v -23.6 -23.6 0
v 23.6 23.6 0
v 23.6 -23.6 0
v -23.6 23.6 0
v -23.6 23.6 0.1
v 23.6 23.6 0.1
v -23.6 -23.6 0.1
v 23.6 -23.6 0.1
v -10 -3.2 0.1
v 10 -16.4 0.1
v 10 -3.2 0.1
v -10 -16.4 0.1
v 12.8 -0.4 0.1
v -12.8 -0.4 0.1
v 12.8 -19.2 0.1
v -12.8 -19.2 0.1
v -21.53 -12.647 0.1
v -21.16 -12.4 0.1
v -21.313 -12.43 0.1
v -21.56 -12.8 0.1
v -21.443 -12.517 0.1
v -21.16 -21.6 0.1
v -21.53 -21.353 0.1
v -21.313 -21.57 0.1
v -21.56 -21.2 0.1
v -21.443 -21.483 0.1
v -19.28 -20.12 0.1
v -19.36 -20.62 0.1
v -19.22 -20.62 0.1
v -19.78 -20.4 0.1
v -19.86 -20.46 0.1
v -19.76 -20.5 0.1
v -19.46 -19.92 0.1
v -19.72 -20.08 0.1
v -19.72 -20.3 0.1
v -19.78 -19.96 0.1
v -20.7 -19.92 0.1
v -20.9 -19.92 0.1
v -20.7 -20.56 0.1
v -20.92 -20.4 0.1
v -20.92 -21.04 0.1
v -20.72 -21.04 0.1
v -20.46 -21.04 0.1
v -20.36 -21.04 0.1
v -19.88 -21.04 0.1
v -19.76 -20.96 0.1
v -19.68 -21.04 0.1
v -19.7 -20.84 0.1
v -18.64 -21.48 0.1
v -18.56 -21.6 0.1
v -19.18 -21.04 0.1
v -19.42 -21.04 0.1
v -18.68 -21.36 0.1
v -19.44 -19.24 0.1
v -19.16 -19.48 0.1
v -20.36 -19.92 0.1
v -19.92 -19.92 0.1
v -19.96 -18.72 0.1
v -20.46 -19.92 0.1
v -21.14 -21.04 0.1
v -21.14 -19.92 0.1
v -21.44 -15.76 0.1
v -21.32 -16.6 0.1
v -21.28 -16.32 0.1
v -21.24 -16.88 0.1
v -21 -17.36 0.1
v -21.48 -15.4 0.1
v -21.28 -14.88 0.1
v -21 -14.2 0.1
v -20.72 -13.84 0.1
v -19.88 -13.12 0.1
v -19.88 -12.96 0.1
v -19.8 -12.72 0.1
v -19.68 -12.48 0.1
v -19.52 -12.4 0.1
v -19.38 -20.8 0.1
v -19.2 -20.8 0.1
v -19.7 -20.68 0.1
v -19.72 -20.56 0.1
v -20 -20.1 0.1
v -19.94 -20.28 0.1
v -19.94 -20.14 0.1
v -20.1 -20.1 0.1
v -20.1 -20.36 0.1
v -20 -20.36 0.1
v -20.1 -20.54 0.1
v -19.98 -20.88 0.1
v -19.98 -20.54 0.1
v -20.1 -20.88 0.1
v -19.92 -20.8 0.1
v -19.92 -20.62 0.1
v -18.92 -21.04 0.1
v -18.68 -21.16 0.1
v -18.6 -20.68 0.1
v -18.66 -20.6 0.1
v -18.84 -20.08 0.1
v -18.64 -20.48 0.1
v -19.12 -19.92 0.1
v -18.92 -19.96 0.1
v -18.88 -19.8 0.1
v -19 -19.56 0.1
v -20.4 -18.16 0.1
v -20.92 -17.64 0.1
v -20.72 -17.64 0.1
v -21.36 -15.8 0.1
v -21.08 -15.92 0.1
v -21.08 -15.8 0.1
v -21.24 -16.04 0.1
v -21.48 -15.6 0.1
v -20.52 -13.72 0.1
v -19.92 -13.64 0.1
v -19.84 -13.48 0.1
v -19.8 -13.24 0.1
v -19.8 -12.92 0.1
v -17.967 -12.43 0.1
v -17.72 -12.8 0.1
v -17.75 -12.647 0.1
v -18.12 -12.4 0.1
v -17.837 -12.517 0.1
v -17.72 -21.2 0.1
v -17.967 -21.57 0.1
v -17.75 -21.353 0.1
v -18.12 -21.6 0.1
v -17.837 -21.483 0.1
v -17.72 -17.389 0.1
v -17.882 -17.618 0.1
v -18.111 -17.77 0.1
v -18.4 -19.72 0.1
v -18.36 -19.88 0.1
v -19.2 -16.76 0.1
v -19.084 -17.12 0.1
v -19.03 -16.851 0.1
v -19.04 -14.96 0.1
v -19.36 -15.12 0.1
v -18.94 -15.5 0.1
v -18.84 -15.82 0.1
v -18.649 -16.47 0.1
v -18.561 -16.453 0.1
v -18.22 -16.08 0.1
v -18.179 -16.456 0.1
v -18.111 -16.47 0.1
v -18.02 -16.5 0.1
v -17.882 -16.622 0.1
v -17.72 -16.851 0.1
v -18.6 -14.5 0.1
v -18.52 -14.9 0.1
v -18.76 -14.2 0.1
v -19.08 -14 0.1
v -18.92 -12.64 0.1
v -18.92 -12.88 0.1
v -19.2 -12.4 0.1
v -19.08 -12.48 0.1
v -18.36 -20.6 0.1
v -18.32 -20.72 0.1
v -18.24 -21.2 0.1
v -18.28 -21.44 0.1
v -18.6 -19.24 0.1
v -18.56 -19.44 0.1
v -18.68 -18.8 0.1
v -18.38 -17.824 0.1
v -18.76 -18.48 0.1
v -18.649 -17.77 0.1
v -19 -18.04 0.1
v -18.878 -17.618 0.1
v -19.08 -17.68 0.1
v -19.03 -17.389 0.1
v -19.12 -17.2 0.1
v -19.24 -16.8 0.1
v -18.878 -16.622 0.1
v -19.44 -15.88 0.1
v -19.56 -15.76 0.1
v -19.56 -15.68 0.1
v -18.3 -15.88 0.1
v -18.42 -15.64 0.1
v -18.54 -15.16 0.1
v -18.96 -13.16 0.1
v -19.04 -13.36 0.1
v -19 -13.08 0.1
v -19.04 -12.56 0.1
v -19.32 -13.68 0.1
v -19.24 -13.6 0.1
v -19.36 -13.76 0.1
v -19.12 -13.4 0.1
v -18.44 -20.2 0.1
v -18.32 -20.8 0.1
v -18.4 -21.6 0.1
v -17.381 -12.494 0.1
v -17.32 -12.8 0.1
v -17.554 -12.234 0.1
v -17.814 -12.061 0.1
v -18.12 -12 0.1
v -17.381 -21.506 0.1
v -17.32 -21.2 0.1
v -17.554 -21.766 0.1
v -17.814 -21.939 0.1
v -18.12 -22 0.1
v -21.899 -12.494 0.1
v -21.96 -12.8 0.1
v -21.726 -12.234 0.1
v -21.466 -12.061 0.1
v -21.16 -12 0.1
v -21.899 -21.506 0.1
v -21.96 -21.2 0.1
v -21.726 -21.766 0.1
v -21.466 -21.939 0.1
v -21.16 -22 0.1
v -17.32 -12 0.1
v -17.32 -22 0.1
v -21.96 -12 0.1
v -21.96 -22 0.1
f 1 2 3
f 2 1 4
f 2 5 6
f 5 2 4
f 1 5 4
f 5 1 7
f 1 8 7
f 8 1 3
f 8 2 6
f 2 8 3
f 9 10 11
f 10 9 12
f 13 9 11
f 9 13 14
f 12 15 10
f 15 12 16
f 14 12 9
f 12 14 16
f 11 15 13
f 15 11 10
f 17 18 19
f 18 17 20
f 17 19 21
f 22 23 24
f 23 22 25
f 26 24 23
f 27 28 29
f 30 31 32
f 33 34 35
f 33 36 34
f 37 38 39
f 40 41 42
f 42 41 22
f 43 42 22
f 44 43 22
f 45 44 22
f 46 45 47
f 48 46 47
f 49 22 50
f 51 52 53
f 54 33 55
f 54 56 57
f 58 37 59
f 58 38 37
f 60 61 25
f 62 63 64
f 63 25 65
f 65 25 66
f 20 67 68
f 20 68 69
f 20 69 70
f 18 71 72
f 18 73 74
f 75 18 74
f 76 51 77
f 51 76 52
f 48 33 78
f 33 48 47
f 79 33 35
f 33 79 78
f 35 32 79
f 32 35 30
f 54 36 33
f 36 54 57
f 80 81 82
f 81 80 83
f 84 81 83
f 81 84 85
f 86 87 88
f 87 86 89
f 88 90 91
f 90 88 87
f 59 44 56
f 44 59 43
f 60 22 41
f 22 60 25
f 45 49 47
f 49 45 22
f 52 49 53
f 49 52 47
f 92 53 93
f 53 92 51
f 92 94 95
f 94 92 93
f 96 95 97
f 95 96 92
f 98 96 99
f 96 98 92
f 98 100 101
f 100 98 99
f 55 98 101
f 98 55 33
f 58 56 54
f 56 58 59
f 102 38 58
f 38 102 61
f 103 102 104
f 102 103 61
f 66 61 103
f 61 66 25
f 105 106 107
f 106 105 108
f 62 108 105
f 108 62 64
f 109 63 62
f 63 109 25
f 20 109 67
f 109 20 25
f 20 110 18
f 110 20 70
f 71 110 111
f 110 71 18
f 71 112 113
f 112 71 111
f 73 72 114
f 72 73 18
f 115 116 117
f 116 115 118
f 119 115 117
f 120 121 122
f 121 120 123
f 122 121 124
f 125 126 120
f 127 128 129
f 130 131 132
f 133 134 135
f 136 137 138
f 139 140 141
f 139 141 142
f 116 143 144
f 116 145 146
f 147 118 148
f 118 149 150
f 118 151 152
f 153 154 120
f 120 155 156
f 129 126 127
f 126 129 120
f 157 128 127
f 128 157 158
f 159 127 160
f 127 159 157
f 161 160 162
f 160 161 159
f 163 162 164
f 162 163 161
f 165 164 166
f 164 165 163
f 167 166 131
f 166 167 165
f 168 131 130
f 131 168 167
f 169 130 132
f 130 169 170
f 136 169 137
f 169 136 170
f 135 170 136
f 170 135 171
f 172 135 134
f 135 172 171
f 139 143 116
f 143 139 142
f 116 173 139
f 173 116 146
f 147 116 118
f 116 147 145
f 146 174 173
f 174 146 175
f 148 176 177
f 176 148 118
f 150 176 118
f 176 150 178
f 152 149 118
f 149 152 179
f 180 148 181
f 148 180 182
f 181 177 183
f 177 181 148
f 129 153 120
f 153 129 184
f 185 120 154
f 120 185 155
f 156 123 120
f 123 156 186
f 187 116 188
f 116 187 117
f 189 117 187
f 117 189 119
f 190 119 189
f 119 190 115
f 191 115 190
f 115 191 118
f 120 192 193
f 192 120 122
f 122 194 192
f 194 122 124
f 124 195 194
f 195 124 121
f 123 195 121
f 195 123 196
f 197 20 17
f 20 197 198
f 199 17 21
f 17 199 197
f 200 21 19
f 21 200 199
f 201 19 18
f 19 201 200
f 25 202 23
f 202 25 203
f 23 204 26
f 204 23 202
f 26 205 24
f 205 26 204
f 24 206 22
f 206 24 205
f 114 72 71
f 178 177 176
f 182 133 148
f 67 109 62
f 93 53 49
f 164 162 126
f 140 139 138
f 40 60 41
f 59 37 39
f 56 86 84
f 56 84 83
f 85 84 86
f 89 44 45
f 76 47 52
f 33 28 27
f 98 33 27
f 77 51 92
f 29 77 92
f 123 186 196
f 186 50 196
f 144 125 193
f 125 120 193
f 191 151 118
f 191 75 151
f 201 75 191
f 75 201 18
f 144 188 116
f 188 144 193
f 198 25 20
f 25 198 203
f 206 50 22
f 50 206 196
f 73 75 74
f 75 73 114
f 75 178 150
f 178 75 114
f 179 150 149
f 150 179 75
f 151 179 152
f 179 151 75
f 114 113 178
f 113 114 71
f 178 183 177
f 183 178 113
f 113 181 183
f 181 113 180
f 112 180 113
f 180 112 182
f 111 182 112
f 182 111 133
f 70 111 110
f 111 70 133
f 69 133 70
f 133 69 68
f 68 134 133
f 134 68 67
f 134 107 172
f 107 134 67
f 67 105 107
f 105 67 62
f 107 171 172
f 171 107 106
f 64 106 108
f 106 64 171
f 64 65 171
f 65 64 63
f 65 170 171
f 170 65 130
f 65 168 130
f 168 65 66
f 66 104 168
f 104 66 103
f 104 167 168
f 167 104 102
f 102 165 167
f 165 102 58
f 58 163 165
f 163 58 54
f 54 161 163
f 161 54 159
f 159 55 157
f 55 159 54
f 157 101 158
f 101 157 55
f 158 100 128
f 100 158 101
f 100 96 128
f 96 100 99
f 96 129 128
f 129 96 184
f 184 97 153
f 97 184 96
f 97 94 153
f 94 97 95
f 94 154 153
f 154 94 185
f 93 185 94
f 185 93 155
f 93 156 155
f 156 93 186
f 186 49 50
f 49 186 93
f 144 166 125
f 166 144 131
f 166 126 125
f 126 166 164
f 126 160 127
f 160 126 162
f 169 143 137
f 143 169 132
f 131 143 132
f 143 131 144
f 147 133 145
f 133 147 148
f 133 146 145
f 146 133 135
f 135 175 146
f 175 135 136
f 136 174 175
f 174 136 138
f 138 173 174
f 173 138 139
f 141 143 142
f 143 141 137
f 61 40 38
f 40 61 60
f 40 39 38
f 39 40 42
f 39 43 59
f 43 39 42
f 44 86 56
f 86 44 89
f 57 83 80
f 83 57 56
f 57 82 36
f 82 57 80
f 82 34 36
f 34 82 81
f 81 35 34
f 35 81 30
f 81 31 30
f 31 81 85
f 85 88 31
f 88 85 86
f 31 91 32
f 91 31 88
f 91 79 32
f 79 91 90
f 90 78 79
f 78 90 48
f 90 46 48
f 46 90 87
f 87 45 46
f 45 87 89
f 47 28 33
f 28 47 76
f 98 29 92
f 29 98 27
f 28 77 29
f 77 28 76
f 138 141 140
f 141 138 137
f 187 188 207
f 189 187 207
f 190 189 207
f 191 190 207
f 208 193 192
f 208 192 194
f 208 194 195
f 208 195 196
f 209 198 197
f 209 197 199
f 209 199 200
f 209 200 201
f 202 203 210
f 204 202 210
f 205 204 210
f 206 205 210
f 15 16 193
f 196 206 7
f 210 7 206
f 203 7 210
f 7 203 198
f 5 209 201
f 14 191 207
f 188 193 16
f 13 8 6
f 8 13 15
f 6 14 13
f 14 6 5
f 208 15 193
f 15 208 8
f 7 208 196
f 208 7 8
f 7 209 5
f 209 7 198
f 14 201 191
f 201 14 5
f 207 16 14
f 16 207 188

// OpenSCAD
// file: ../p/1-4ring1.scad
use <../lib.scad>
function ldraw_lib__1_4ring1() = [
// 0 Ring  1 x 0.25
// 0 Name: 1-4ring1.dat
// 0 Author: Chris Dee [cwdee]
// 0 !LDRAW_ORG Primitive UPDATE 2012-01
// 0 !LICENSE Licensed under CC BY 4.0 : see CAreadme.txt
// 
// 0 BFC CERTIFY CCW
  [0,"BFC","CERTIFY"],
  [0,"BFC","CCW"],
// 
// 0 !HISTORY 2000-05-07 [PTadmin] Official Update 2000-01
// 0 !HISTORY 2002-11-22 [hafhead] Added BFC statement
// 0 !HISTORY 2002-11-30 [PTadmin] Official Update 2002-05
// 0 !HISTORY 2007-06-22 [PTadmin] Header formatted for Contributor Agreement
// 0 !HISTORY 2008-07-01 [PTadmin] Official Update 2008-01
// 0 !HISTORY 2012-02-16 [Philo] Changed to CCW
// 0 !HISTORY 2012-03-30 [PTadmin] Official Update 2012-01
// 
// 
// 4 16 2 0 0 1.8478 0 0.7654 0.9239 0 0.3827 1 0 0
  [4,16,2,0,0,1.8478,0,0.7654,0.9239,0,0.3827,1,0,0],
// 4 16 1.8478 0 0.7654 1.4142 0 1.4142 0.7071 0 0.7071 0.9239 0 0.3827
  [4,16,1.8478,0,0.7654,1.4142,0,1.4142,0.7071,0,0.7071,0.9239,0,0.3827],
// 4 16 1.4142 0 1.4142 0.7654 0 1.8478 0.3827 0 0.9239 0.7071 0 0.7071
  [4,16,1.4142,0,1.4142,0.7654,0,1.8478,0.3827,0,0.9239,0.7071,0,0.7071],
// 4 16 0.7654 0 1.8478 0 0 2 0 0 1 0.3827 0 0.9239
  [4,16,0.7654,0,1.8478,0,0,2,0,0,1,0.3827,0,0.9239],
];
module ldraw_lib__1_4ring1(step=0, col=false, unit=2/5, alt=false, line=0.2, solid=!$preview)
    makepoly(ldraw_lib__1_4ring1(), step=step, col=col, unit=unit, alt=alt, line=line, solid=solid);
ldraw_lib__1_4ring1(line=0.2);
// file: ../p/1-4chrd.scad
use <../lib.scad>
function ldraw_lib__1_4chrd() = [
// 0 Chord 0.25
// 0 Name: 1-4chrd.dat
// 0 Author: Max Martin Richter [MMR1988]
// 0 !LDRAW_ORG Primitive UPDATE 2023-05
// 0 !LICENSE Licensed under CC BY 4.0 : see CAreadme.txt
// 
// 0 BFC CERTIFY CCW
  [0,"BFC","CERTIFY"],
  [0,"BFC","CCW"],
// 
// 0 !HISTORY 2004-04-22 [PTadmin] Official Update 2004-02
// 0 !HISTORY 2007-10-09 [PTadmin] Header formatted for Contributor Agreement
// 0 !HISTORY 2008-07-01 [PTadmin] Official Update 2008-01
// 0 !HISTORY 2012-08-02 [MMR1988] Re-creation with PrimGen2 and Rectifier
// 0 !HISTORY 2012-08-09 [PTadmin] Official Update 2012-02
// 0 !HISTORY 2023-10-27 [OrionP] Change author to MMR1988 from hafhead
// 0 !HISTORY 2023-10-31 [OrionP] Official Update 2023-05
// 
// 4 16 0.9239 0 0.3827 0.3827 0 0.9239 0 0 1 1 0 0
  [4,16,0.9239,0,0.3827,0.3827,0,0.9239,0,0,1,1,0,0],
// 3 16 0.7071 0 0.7071 0.3827 0 0.9239 0.9239 0 0.3827
  [3,16,0.7071,0,0.7071,0.3827,0,0.9239,0.9239,0,0.3827],
];
module ldraw_lib__1_4chrd(step=0, col=false, unit=2/5, alt=false, line=0.2, solid=!$preview)
    makepoly(ldraw_lib__1_4chrd(), step=step, col=col, unit=unit, alt=alt, line=line, solid=solid);
ldraw_lib__1_4chrd(line=0.2);
// file: ../p/box5-12.scad
use <../lib.scad>
function ldraw_lib__box5_12() = [
// 0 Box with 5 Faces without Any Edges
// 0 Name: box5-12.dat
// 0 Author: Chris Dee [cwdee]
// 0 !LDRAW_ORG Primitive UPDATE 2009-02
// 0 !LICENSE Licensed under CC BY 4.0 : see CAreadme.txt
// 
// 0 BFC CERTIFY CCW
  [0,"BFC","CERTIFY"],
  [0,"BFC","CCW"],
// 
// 0 !HISTORY 2009-09-03 [PTadmin] Official Update 2009-02
// 
// 
// 4 16 1 1 1 1 1 -1 -1 1 -1 -1 1 1
  [4,16,1,1,1,1,1,-1,-1,1,-1,-1,1,1],
// 4 16 -1 0 1 1 0 1 1 1 1 -1 1 1
  [4,16,-1,0,1,1,0,1,1,1,1,-1,1,1],
// 4 16 -1 0 -1 -1 0 1 -1 1 1 -1 1 -1
  [4,16,-1,0,-1,-1,0,1,-1,1,1,-1,1,-1],
// 4 16 1 0 -1 -1 0 -1 -1 1 -1 1 1 -1
  [4,16,1,0,-1,-1,0,-1,-1,1,-1,1,1,-1],
// 4 16 1 0 1 1 0 -1 1 1 -1 1 1 1
  [4,16,1,0,1,1,0,-1,1,1,-1,1,1,1],
// 0
];
module ldraw_lib__box5_12(step=0, col=false, unit=2/5, alt=false, line=0.2, solid=!$preview)
    makepoly(ldraw_lib__box5_12(), step=step, col=col, unit=unit, alt=alt, line=line, solid=solid);
ldraw_lib__box5_12(line=0.2);
// file: ../p/1-4ndis.scad
use <../lib.scad>
function ldraw_lib__1_4ndis() = [
// 0 Disc Negative 0.25
// 0 Name: 1-4ndis.dat
// 0 Author: James Jessiman
// 0 !LDRAW_ORG Primitive UPDATE 2012-01
// 0 !LICENSE Licensed under CC BY 4.0 : see CAreadme.txt
// 
// 0 BFC CERTIFY CCW
  [0,"BFC","CERTIFY"],
  [0,"BFC","CCW"],
// 
// 0 !HISTORY 2002-03-23 [sbliss] Added BFC Statement
// 0 !HISTORY 2002-04-25 [PTadmin] Official Update 2002-02
// 0 !HISTORY 2007-06-22 [PTadmin] Header formatted for Contributor Agreement
// 0 !HISTORY 2008-07-01 [PTadmin] Official Update 2008-01
// 0 !HISTORY 2012-02-16 [Philo] Changed to CCW
// 0 !HISTORY 2012-03-30 [PTadmin] Official Update 2012-01
// 
// 
// 3 16 0.9239 0 0.3827 1 0 0 1 0 1
  [3,16,0.9239,0,0.3827,1,0,0,1,0,1],
// 3 16 0.7071 0 0.7071 0.9239 0 0.3827 1 0 1
  [3,16,0.7071,0,0.7071,0.9239,0,0.3827,1,0,1],
// 3 16 0.3827 0 0.9239 0.7071 0 0.7071 1 0 1
  [3,16,0.3827,0,0.9239,0.7071,0,0.7071,1,0,1],
// 3 16 0 0 1 0.3827 0 0.9239 1 0 1
  [3,16,0,0,1,0.3827,0,0.9239,1,0,1],
];
module ldraw_lib__1_4ndis(step=0, col=false, unit=2/5, alt=false, line=0.2, solid=!$preview)
    makepoly(ldraw_lib__1_4ndis(), step=step, col=col, unit=unit, alt=alt, line=line, solid=solid);
ldraw_lib__1_4ndis(line=0.2);
// main file
use <../lib.scad>
use <../p/1-4ndis.scad>
use <../p/box5-12.scad>
use <../p/logo-nba.scad>
function ldraw_lib__4188848a() = [
// 0 Sticker  5.9 x  5.9 with Basketball Backboard and NBA Logo
// 0 Name: 4188848a.dat
// 0 Author: Chris Böhnke [KnightOfTarenta]
// 0 !LDRAW_ORG Part UPDATE 2025-08
// 0 !LICENSE Licensed under CC BY 4.0 : see CAreadme.txt
// 
// 0 BFC CERTIFY CCW
  [0,"BFC","CERTIFY"],
  [0,"BFC","CCW"],
// 
// 0 !KEYWORDS BrickLink 3430stk01, Rebrickable 42039a, Set 3430, Set 3440, Sports
// 
// 0 !HISTORY 2025-07-17 [KnightOfTarenta] Inlined from 3754p03.dat by Philippe Hurbain/Rene Rechthaler
// 0 !HISTORY 2025-08-31 [OrionP] Official Update 2025-08
// 
// 0 // Sticker Back
// 1 16 0 -0.25 0 59 0 0 0 0.25 0 0 0 59 box5-12.dat
  [1,16,0,-0.25,0,59,0,0,0,0.25,0,0,0,59, ldraw_lib__box5_12()],
// 
// 0 // Backboard
// 4 16 25 -.25 -8 -25 -.25 -8 -25 -.25 -41 25 -.25 -41
  [4,16,25,-.25,-8,-25,-.25,-8,-25,-.25,-41,25,-.25,-41],
// 0 BFC NOCLIP
  [0,"BFC","NOCLIP"],
// 4 15 32 -.25 -1 -32 -.25 -1 -25 -.25 -8 25 -.25 -8
  [4,15,32,-.25,-1,-32,-.25,-1,-25,-.25,-8,25,-.25,-8],
// 4 15 -25 -.25 -41 -32 -.25 -48 32 -.25 -48 25 -.25 -41
  [4,15,-25,-.25,-41,-32,-.25,-48,32,-.25,-48,25,-.25,-41],
// 4 15 -32 -.25 -1 -32 -.25 -48 -25 -.25 -41 -25 -.25 -8
  [4,15,-32,-.25,-1,-32,-.25,-48,-25,-.25,-41,-25,-.25,-8],
// 4 15 32 -.25 -1 25 -.25 -8 25 -.25 -41 32 -.25 -48
  [4,15,32,-.25,-1,25,-.25,-8,25,-.25,-41,32,-.25,-48],
// 0 // NBA Logo
// 1 16 -49.1 -.25 -42.5 1 0 0 0 1 0 0 0 1 logo-nba.dat
  [1,16,-49.1,-.25,-42.5,1,0,0,0,1,0,0,0,1, ldraw_lib__logo_nba()],
// 0 BFC CLIP
  [0,"BFC","CLIP"],
// 0 // Surroundings
// 1 16 -45.3 -.25 -32 2 0 0 0 1 0 0 0 2 1-4ndis.dat
  [1,16,-45.3,-.25,-32,2,0,0,0,1,0,0,0,2, ldraw_lib__1_4ndis()],
// 1 16 -45.3 -.25 -53 2 0 0 0 1 0 0 0 -2 1-4ndis.dat
  [1,16,-45.3,-.25,-53,2,0,0,0,1,0,0,0,-2, ldraw_lib__1_4ndis()],
// 1 16 -52.9 -.25 -32 -2 0 0 0 1 0 0 0 2 1-4ndis.dat
  [1,16,-52.9,-.25,-32,-2,0,0,0,1,0,0,0,2, ldraw_lib__1_4ndis()],
// 1 16 -52.9 -.25 -53 -2 0 0 0 1 0 0 0 -2 1-4ndis.dat
  [1,16,-52.9,-.25,-53,-2,0,0,0,1,0,0,0,-2, ldraw_lib__1_4ndis()],
// 3 16 32 -.25 -48 -32 -.25 -48 -43.3 -.25 -53
  [3,16,32,-.25,-48,-32,-.25,-48,-43.3,-.25,-53],
// 3 16 -45.3 -.25 -55 -52.9 -.25 -55 -59 -.25 -59
  [3,16,-45.3,-.25,-55,-52.9,-.25,-55,-59,-.25,-59],
// 3 16 -54.9 -.25 -55 -59 -.25 -59 -52.9 -.25 -55
  [3,16,-54.9,-.25,-55,-59,-.25,-59,-52.9,-.25,-55],
// 3 16 -54.9 -.25 -53 -59 -.25 -59 -54.9 -.25 -55
  [3,16,-54.9,-.25,-53,-59,-.25,-59,-54.9,-.25,-55],
// 3 16 -59 -.25 -59 -54.9 -.25 -53 -54.9 -.25 -32
  [3,16,-59,-.25,-59,-54.9,-.25,-53,-54.9,-.25,-32],
// 3 16 -59 -.25 59 -54.9 -.25 -30 -52.9 -.25 -30
  [3,16,-59,-.25,59,-54.9,-.25,-30,-52.9,-.25,-30],
// 3 16 -32 -.25 -1 -45.3 -.25 -30 -43.3 -.25 -30
  [3,16,-32,-.25,-1,-45.3,-.25,-30,-43.3,-.25,-30],
// 3 16 -43.3 -.25 -32 -43.3 -.25 -53 -32 -.25 -48
  [3,16,-43.3,-.25,-32,-43.3,-.25,-53,-32,-.25,-48],
// 4 16 32 -.25 -48 59 -.25 -59 59 -.25 59 32 -.25 -1
  [4,16,32,-.25,-48,59,-.25,-59,59,-.25,59,32,-.25,-1],
// 4 16 -32 -.25 -1 32 -.25 -1 59 -.25 59 -59 -.25 59
  [4,16,-32,-.25,-1,32,-.25,-1,59,-.25,59,-59,-.25,59],
// 4 16 32 -.25 -48 -43.3 -.25 -53 -43.3 -.25 -55 59 -.25 -59
  [4,16,32,-.25,-48,-43.3,-.25,-53,-43.3,-.25,-55,59,-.25,-59],
// 4 16 -45.3 -.25 -55 -59 -.25 -59 59 -.25 -59 -43.3 -.25 -55
  [4,16,-45.3,-.25,-55,-59,-.25,-59,59,-.25,-59,-43.3,-.25,-55],
// 4 16 -59 -.25 -59 -54.9 -.25 -32 -54.9 -.25 -30 -59 -.25 59
  [4,16,-59,-.25,-59,-54.9,-.25,-32,-54.9,-.25,-30,-59,-.25,59],
// 4 16 -59 -.25 59 -52.9 -.25 -30 -45.3 -.25 -30 -32 -.25 -1
  [4,16,-59,-.25,59,-52.9,-.25,-30,-45.3,-.25,-30,-32,-.25,-1],
// 4 16 -32 -.25 -1 -43.3 -.25 -30 -43.3 -.25 -32 -32 -.25 -48
  [4,16,-32,-.25,-1,-43.3,-.25,-30,-43.3,-.25,-32,-32,-.25,-48],
];
module ldraw_lib__4188848a(step=0, col=false, unit=2/5, alt=false, line=0.2, solid=!$preview)
    makepoly(ldraw_lib__4188848a(), step=step, col=col, unit=unit, alt=alt, line=line, solid=solid);
ldraw_lib__4188848a(line=0.2);
